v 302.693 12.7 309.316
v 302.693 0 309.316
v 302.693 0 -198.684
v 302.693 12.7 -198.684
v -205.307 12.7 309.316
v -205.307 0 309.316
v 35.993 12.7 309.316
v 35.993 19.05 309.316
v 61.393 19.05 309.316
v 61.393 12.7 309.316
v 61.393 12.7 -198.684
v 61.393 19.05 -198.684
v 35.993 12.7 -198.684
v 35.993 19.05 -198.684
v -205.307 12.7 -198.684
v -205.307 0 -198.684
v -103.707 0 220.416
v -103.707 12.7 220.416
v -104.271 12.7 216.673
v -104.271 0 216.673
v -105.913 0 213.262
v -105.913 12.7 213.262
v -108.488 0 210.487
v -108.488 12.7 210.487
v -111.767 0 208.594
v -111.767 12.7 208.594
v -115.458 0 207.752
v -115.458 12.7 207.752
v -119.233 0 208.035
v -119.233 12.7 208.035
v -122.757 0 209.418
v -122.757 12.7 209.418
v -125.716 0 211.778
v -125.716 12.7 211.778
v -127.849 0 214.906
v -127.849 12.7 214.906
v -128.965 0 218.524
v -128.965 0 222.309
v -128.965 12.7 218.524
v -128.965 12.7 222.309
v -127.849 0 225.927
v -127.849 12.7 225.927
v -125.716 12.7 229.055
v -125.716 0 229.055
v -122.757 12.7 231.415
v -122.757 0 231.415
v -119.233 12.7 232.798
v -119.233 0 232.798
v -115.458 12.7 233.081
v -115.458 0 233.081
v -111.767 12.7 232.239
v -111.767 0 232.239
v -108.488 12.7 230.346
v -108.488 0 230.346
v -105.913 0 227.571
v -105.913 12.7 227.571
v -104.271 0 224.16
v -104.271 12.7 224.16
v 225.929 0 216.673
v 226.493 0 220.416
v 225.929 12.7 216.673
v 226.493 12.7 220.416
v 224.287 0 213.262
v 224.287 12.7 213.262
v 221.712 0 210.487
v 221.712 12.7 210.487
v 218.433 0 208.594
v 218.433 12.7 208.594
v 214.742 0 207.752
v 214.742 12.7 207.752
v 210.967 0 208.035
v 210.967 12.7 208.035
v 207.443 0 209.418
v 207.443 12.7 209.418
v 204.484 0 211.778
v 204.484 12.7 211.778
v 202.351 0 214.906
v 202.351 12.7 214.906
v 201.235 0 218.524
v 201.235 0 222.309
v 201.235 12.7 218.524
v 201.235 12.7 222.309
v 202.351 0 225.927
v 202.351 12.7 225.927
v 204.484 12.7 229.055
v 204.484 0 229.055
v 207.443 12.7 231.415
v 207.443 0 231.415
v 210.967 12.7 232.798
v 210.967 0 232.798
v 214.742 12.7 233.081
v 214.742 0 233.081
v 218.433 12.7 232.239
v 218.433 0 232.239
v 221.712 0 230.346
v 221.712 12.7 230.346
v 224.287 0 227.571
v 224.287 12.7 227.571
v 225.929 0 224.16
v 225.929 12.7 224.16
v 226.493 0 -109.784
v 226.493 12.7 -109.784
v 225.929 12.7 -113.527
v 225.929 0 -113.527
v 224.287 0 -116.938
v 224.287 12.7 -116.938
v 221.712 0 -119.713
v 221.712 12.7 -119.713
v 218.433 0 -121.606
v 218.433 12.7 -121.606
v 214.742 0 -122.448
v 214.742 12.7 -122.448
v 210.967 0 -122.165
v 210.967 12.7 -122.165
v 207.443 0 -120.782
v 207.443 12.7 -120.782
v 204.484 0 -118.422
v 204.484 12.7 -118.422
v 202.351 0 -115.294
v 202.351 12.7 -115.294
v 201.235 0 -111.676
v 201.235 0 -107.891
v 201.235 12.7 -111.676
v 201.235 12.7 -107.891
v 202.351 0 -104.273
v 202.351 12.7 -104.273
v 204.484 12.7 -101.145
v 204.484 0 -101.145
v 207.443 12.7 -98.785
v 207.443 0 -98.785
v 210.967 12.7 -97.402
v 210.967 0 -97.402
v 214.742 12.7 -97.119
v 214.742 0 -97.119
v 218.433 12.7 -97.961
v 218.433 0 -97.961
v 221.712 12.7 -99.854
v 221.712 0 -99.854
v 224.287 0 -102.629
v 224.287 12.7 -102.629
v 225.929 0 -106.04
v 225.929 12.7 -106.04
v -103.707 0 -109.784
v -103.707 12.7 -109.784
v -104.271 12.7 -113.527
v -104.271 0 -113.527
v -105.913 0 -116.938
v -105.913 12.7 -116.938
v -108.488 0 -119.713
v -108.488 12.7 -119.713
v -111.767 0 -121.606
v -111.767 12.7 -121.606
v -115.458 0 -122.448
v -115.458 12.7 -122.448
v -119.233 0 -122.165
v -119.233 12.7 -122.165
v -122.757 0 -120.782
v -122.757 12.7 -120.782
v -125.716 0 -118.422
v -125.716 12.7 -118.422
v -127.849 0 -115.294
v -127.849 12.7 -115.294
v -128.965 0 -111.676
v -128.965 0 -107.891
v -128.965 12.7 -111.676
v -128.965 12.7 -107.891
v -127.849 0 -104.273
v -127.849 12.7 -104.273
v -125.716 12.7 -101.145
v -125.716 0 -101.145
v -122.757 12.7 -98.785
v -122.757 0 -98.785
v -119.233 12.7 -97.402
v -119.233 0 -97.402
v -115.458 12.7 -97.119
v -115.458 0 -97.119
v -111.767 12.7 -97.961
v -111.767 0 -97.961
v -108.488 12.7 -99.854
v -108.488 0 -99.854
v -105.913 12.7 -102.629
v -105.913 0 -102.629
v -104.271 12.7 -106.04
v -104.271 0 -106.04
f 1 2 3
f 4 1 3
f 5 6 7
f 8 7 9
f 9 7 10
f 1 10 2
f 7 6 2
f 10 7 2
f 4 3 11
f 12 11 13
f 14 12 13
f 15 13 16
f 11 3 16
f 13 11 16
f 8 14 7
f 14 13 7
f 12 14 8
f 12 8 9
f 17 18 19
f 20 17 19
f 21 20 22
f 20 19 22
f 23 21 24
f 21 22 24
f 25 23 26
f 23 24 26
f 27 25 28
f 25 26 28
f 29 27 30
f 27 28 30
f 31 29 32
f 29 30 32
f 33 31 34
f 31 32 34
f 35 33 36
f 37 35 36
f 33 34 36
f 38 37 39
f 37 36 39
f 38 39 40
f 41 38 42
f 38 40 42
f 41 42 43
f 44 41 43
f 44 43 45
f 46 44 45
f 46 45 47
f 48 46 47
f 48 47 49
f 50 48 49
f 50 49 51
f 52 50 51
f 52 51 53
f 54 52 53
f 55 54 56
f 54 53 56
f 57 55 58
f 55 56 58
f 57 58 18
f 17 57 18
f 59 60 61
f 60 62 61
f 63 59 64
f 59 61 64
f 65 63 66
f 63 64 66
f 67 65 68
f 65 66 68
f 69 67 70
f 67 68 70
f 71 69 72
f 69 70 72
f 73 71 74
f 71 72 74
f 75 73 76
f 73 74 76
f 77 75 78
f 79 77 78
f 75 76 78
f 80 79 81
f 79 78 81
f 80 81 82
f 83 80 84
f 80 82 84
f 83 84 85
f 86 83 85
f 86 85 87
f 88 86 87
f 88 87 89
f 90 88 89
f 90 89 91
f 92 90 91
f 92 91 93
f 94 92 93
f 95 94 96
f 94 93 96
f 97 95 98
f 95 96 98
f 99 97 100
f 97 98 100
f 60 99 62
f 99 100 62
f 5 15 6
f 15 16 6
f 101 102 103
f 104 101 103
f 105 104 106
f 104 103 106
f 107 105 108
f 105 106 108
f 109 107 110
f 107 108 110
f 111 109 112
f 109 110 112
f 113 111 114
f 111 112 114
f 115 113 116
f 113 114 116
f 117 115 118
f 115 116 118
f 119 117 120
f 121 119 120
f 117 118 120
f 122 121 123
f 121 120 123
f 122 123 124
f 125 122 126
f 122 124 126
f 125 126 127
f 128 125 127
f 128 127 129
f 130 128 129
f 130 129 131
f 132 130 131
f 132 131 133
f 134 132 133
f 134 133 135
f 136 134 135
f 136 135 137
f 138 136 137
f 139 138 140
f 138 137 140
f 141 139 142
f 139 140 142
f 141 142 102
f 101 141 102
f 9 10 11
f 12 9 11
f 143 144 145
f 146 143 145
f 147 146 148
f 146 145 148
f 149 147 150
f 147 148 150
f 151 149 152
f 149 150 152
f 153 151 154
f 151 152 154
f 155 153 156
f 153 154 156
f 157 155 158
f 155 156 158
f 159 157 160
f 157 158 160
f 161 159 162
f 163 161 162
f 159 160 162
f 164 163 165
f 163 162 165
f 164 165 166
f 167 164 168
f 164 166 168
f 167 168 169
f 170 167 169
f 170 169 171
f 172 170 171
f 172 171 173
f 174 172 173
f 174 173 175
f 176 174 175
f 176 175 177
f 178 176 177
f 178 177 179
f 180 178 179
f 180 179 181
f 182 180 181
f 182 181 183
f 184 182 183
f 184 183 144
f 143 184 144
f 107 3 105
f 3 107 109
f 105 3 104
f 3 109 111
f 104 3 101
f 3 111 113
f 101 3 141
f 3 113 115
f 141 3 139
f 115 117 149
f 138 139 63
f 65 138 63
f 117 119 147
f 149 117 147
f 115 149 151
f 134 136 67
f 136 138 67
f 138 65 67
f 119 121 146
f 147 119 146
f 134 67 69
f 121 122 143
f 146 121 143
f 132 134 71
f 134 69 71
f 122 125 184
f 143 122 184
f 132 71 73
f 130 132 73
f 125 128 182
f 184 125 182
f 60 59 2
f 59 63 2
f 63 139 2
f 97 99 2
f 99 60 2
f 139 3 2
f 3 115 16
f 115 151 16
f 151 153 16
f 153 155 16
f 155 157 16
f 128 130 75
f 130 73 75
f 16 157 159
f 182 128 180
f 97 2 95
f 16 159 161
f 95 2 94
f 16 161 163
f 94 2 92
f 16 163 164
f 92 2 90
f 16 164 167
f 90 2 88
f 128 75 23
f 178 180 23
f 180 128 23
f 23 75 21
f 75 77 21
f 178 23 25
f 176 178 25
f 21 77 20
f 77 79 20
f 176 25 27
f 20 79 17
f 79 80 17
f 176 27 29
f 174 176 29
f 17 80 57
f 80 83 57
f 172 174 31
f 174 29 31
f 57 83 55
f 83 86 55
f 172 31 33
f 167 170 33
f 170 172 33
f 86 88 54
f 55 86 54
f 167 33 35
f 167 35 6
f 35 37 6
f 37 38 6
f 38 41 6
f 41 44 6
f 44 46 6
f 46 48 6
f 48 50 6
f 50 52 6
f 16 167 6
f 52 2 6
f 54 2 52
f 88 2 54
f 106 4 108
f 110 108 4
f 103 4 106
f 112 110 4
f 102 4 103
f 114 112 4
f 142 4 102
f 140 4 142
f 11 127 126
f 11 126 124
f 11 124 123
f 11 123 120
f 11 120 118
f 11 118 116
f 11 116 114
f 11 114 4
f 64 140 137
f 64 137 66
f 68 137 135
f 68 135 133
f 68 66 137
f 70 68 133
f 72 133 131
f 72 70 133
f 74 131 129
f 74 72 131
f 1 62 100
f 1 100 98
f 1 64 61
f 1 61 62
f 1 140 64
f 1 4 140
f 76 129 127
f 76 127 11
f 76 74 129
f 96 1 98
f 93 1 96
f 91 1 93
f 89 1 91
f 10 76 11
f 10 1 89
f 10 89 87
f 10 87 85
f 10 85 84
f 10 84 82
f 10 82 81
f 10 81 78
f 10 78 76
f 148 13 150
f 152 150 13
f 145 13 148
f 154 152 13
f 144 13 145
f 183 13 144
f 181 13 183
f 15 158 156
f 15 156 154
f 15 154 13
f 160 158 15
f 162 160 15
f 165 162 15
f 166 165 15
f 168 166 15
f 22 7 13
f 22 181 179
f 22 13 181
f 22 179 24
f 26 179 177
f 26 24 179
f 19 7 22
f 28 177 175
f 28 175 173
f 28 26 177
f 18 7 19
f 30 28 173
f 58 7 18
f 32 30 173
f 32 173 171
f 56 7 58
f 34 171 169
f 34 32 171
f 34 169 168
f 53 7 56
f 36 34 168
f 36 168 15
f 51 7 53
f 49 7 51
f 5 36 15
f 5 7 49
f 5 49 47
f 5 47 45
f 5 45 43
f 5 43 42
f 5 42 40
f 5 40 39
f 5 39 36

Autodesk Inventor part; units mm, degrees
ref_plane "YZ Plane" through (0, 0, 0) normal (1, 0, 0) x (0, 1, 0)
ref_plane "XZ Plane" through (0, 0, 0) normal (0, 1, 0) x (-1, 0, 0)
ref_plane "XY Plane" through (0, 0, 0) normal (0, 0, 1) x (1, 0, 0)
sketch "Sketch1" plane through (0, 0, 0) normal (0, 0, 1) x (1, 0, 0)
  point P0 (0, 0)
sketch "Sketch2" plane through (0, 0, 0) normal (0, 1, 0) x (-1, 0, 0)
  line L0 (205.3066, 309.3165) -> (-302.6934, 309.3165)
  line L1 (-302.6934, 309.3165) -> (-302.6934, -198.6835)
  line L2 (-302.6934, -198.6835) -> (205.3066, -198.6835)
  line L3 (205.3066, -198.6835) -> (205.3066, 309.3165)
  point P0 (0, 0)
  dimension "d0" = 508
  dimension "d1" = 508
extrude "Extrusion1" add sketch "Sketch2" along normal blind 12.7
sketch "Sketch3" plane through (0, 12.7, 0) normal (0, 1, 0) x (1, 0, 0)
  line L0 (-205.3066, -309.3165) -> (-116.4066, -309.3165)
  line L1 (-116.4066, -309.3165) -> (-116.4066, -220.4165)
  line L2 (-116.4066, -220.4165) -> (-205.3066, -220.4165)
  line L3 (-205.3066, -220.4165) -> (-205.3066, -309.3165)
  line L4 (-205.3066, 198.6835) -> (-116.4066, 198.6835)
  line L5 (-116.4066, 198.6835) -> (-116.4066, 109.7835)
  line L6 (-116.4066, 109.7835) -> (-205.3066, 109.7835)
  line L7 (-205.3066, 109.7835) -> (-205.3066, 198.6835)
  line L8 (302.6934, 198.6835) -> (213.7934, 198.6835)
  line L9 (213.7934, 198.6835) -> (213.7934, 109.7835)
  line L10 (213.7934, 109.7835) -> (302.6934, 109.7835)
  line L11 (302.6934, 109.7835) -> (302.6934, 198.6835)
  line L12 (302.6934, -309.3165) -> (213.7934, -309.3165)
  line L13 (213.7934, -309.3165) -> (213.7934, -220.4165)
  line L14 (213.7934, -220.4165) -> (302.6934, -220.4165)
  line L15 (302.6934, -220.4165) -> (302.6934, -309.3165)
  circle A0 centre (-116.4066, -220.4165) radius 12.7
  circle A1 centre (-116.4066, 109.7835) radius 12.7
  circle A2 centre (213.7934, 109.7835) radius 12.7
  circle A3 centre (213.7934, -220.4165) radius 12.7
  point P0 (0, 0)
  dimension "d4" = 88.9
  dimension "d5" = 88.9
  dimension "d6" = 88.9
  dimension "d7" = 88.9
  dimension "d8" = 88.9
  dimension "d9" = 88.9
  dimension "d10" = 88.9
  dimension "d11" = 88.9
  dimension "d12" = 25.4
  dimension "d13" = 25.4
  dimension "d14" = 25.4
  dimension "d15" = 25.4
extrude "Extrusion2" cut sketch "Sketch3" against normal blind 12.7 contours A0 L2 L1 | L1 L2 A0 | A1 L6 L5 | L5 L6 A1 | A2 L10 L9 | L9 L10 A2 | A3 L14 L13 | L13 L14 A3
sketch "Sketch4" plane through (0, 12.7, 0) normal (0, 1, 0) x (1, 0, 0)
  line L0 (302.6934, -309.3165) -> (-205.3066, -309.3165) projected
  line L1 (-205.3066, 198.6835) -> (302.6934, 198.6835) projected
  line L2 (302.6934, 198.6835) -> (48.6934, 198.6835)
  line L3 (48.6934, 198.6835) -> (74.0934, 198.6835)
  line L4 (74.0934, 198.6835) -> (61.3934, 198.6835)
  line L5 (61.3934, 198.6835) -> (35.9934, 198.6835)
  line L6 (35.9934, 198.6835) -> (35.9934, -309.3165)
  line L7 (35.9934, -309.3165) -> (61.3934, -309.3165)
  line L8 (61.3934, -309.3165) -> (61.3934, 198.6835)
  line L9 (61.3934, 198.6835) -> (35.9934, 198.6835)
  line L10 (35.9934, 198.6835) -> (35.9934, -309.3165)
  point P0 (0, 0)
  dimension "d18" = 254
  dimension "d19" = 25.4
  dimension "d20" = 12.7
  dimension "d21" = 25.4
extrude "Extrusion3" add sketch "Sketch4" along normal blind 6.35
properties part number "base"
